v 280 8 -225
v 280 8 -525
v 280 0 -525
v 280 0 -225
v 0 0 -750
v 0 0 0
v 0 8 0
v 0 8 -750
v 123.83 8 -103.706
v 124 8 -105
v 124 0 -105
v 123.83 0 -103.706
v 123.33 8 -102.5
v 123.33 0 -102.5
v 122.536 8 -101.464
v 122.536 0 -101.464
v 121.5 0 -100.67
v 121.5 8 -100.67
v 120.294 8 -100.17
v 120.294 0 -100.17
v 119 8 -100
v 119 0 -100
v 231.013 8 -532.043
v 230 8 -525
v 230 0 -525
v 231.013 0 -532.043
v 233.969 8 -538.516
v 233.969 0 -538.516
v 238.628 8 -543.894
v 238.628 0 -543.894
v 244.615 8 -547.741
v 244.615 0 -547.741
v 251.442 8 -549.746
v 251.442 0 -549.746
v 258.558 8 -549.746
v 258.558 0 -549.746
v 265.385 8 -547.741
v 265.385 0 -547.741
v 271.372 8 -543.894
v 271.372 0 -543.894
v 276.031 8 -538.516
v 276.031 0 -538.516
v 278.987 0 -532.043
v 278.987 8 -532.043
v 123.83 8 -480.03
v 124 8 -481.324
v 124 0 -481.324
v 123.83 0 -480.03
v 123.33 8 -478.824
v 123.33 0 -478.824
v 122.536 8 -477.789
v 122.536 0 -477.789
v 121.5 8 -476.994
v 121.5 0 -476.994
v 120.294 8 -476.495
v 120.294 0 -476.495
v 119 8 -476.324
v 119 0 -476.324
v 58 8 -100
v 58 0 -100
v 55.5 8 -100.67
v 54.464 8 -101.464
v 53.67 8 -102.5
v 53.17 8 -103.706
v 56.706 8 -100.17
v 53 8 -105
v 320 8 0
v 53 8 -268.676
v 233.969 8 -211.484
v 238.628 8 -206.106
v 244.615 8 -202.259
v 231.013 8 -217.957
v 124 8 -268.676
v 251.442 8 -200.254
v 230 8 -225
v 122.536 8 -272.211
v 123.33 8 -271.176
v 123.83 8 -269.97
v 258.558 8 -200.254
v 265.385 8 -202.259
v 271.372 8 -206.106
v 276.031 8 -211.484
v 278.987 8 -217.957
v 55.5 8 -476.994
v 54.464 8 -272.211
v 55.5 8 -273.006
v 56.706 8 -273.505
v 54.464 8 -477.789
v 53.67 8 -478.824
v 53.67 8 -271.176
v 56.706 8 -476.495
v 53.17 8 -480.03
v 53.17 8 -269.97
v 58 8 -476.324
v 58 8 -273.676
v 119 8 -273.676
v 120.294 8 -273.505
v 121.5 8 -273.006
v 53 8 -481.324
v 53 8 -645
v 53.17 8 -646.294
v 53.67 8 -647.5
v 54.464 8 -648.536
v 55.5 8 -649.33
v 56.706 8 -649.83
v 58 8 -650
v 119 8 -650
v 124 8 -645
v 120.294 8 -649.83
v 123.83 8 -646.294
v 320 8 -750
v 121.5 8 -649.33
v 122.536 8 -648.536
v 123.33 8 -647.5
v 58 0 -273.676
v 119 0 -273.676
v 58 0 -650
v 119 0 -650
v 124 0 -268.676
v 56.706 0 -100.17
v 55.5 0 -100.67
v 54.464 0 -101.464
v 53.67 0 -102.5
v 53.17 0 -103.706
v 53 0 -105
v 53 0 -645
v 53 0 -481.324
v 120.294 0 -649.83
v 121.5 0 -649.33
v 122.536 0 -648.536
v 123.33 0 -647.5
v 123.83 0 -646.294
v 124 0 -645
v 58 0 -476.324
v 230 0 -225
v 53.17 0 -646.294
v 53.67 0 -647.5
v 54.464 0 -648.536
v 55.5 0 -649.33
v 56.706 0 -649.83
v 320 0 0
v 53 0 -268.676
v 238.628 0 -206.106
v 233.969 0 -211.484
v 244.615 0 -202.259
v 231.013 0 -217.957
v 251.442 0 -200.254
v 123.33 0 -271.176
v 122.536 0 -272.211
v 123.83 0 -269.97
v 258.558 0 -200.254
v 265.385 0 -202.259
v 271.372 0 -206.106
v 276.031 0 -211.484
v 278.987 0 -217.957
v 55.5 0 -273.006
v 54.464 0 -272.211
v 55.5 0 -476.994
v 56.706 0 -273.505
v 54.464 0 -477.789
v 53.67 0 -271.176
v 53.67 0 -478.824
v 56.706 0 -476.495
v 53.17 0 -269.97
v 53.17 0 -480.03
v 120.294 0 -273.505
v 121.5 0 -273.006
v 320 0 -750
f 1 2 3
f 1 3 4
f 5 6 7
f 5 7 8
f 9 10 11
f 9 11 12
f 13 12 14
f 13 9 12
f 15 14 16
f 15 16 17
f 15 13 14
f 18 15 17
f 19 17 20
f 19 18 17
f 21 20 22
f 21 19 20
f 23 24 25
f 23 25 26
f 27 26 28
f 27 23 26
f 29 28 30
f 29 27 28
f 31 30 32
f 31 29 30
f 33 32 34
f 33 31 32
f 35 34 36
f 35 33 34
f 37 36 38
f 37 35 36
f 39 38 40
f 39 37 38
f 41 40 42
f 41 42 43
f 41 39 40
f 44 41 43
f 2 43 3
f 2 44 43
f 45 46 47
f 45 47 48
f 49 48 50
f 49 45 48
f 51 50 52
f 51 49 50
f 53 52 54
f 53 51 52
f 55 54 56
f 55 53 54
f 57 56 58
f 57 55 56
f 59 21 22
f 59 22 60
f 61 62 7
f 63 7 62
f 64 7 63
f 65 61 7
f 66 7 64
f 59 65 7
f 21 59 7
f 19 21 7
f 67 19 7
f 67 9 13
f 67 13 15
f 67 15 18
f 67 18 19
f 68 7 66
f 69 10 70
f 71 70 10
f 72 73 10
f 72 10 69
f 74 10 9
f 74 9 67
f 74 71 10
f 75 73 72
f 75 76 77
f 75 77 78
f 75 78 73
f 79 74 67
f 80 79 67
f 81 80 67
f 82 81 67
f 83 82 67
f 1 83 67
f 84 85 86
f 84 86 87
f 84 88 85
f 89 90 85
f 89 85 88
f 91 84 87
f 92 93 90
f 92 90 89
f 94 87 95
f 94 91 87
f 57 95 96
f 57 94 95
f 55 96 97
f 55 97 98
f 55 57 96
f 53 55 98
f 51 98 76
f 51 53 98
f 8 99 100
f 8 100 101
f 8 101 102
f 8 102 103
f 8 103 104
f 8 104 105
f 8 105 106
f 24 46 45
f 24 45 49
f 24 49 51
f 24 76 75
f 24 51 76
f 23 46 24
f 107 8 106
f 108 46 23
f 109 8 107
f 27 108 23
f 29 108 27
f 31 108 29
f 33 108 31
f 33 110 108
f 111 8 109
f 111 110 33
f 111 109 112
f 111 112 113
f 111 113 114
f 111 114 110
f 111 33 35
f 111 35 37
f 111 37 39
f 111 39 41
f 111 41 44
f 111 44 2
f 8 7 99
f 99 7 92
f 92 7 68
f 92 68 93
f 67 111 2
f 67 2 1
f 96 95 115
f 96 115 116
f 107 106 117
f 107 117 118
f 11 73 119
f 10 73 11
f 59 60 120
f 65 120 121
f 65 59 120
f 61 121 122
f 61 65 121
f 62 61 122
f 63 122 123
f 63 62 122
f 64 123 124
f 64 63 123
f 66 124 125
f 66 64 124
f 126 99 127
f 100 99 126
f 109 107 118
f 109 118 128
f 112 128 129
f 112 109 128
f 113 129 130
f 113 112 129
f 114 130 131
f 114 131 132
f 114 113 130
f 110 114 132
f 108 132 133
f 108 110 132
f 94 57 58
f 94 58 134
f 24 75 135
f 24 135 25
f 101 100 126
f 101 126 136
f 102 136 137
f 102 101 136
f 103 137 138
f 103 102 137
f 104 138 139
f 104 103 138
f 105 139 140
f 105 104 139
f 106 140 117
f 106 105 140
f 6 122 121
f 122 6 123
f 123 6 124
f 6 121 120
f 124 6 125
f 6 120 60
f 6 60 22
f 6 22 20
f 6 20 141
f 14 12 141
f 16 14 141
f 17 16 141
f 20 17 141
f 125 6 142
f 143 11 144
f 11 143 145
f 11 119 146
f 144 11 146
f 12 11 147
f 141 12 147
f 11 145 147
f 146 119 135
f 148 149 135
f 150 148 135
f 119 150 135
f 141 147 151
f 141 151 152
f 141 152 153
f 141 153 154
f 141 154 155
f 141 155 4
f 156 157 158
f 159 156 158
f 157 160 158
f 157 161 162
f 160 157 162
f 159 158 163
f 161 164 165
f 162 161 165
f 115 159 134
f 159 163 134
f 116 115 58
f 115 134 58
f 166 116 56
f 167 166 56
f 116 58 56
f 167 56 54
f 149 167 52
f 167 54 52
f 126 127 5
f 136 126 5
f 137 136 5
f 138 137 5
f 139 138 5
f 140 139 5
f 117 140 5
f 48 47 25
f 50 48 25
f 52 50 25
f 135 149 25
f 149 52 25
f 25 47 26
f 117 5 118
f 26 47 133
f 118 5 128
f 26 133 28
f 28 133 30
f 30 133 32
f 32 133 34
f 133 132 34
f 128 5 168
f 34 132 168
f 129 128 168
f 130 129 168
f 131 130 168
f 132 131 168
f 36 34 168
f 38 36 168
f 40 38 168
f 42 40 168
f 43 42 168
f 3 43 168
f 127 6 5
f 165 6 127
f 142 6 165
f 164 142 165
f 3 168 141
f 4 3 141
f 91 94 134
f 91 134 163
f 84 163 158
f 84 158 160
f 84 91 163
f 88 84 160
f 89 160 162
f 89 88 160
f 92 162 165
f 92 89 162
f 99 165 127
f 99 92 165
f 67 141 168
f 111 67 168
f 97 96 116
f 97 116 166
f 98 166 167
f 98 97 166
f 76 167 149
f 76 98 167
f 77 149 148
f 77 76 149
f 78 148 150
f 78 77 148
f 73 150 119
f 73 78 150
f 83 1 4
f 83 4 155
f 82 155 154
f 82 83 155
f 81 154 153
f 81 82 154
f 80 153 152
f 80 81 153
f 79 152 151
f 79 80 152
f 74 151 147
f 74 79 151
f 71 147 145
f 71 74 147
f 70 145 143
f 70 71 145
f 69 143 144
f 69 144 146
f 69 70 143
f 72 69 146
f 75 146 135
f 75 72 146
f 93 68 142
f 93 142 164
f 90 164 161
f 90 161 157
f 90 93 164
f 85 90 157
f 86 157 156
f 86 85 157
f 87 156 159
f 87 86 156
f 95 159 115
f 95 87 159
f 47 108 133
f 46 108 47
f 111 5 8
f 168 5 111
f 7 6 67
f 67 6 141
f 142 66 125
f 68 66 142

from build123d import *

# Parameters (mm, degrees)
SKETCH4_W           = 320
SKETCH4_H           = 750
BOSS_EXTRUDE3_DEPTH = 8
CUT_EXTRUDE1_DEPTH  = 8


with BuildPart() as part:
    # Sketch4 → Boss-Extrude3 (new body)
    with BuildSketch(Plane(origin=(0, 0, 0), x_dir=(1, 0, 0), z_dir=(0, 1, 0))):
        with Locations((160, 375)):
            Rectangle(SKETCH4_W, SKETCH4_H)
    extrude(amount=BOSS_EXTRUDE3_DEPTH)

    # Sketch8 → Cut-Extrude1 (cut)
    with BuildSketch(Plane(origin=(0, 8, 0), x_dir=(1, 0, 0), z_dir=(0, 1, 0))):
        with BuildLine():
            Line((119, 100), (58, 100))
            ThreePointArc((58, 100), (54.464466094, 101.464466094), (53, 105))
            Line((53, 105), (53, 268.675816019))
            ThreePointArc((53, 268.675816019), (54.464466094, 272.211349925), (58, 273.675816019))
            Line((58, 273.675816019), (119, 273.675816019))
            ThreePointArc((119, 273.675816019), (122.535533906, 272.211349925), (124, 268.675816019))
            Line((124, 268.675816019), (124, 105))
            ThreePointArc((124, 105), (122.535533906, 101.464466094), (119, 100))
        make_face()
        with BuildLine():
            Line((230, 225), (230, 525))
            ThreePointArc((230, 525), (255, 550), (280, 525))
            Line((280, 525), (280, 225))
            ThreePointArc((280, 225), (255, 200), (230, 225))
        make_face()
        with BuildLine():
            Line((119, 476.324183981), (58, 476.324183981))
            ThreePointArc((58, 476.324183981), (54.464466094, 477.788650075), (53, 481.324183981))
            Line((53, 481.324183981), (53, 645))
            ThreePointArc((53, 645), (54.464466094, 648.535533906), (58, 650))
            Line((58, 650), (119, 650))
            ThreePointArc((119, 650), (122.535533906, 648.535533906), (124, 645))
            Line((124, 645), (124, 481.324183981))
            ThreePointArc((124, 481.324183981), (122.535533906, 477.788650075), (119, 476.324183981))
        make_face()
    extrude(amount=-CUT_EXTRUDE1_DEPTH, mode=Mode.SUBTRACT)


solid = part.part
